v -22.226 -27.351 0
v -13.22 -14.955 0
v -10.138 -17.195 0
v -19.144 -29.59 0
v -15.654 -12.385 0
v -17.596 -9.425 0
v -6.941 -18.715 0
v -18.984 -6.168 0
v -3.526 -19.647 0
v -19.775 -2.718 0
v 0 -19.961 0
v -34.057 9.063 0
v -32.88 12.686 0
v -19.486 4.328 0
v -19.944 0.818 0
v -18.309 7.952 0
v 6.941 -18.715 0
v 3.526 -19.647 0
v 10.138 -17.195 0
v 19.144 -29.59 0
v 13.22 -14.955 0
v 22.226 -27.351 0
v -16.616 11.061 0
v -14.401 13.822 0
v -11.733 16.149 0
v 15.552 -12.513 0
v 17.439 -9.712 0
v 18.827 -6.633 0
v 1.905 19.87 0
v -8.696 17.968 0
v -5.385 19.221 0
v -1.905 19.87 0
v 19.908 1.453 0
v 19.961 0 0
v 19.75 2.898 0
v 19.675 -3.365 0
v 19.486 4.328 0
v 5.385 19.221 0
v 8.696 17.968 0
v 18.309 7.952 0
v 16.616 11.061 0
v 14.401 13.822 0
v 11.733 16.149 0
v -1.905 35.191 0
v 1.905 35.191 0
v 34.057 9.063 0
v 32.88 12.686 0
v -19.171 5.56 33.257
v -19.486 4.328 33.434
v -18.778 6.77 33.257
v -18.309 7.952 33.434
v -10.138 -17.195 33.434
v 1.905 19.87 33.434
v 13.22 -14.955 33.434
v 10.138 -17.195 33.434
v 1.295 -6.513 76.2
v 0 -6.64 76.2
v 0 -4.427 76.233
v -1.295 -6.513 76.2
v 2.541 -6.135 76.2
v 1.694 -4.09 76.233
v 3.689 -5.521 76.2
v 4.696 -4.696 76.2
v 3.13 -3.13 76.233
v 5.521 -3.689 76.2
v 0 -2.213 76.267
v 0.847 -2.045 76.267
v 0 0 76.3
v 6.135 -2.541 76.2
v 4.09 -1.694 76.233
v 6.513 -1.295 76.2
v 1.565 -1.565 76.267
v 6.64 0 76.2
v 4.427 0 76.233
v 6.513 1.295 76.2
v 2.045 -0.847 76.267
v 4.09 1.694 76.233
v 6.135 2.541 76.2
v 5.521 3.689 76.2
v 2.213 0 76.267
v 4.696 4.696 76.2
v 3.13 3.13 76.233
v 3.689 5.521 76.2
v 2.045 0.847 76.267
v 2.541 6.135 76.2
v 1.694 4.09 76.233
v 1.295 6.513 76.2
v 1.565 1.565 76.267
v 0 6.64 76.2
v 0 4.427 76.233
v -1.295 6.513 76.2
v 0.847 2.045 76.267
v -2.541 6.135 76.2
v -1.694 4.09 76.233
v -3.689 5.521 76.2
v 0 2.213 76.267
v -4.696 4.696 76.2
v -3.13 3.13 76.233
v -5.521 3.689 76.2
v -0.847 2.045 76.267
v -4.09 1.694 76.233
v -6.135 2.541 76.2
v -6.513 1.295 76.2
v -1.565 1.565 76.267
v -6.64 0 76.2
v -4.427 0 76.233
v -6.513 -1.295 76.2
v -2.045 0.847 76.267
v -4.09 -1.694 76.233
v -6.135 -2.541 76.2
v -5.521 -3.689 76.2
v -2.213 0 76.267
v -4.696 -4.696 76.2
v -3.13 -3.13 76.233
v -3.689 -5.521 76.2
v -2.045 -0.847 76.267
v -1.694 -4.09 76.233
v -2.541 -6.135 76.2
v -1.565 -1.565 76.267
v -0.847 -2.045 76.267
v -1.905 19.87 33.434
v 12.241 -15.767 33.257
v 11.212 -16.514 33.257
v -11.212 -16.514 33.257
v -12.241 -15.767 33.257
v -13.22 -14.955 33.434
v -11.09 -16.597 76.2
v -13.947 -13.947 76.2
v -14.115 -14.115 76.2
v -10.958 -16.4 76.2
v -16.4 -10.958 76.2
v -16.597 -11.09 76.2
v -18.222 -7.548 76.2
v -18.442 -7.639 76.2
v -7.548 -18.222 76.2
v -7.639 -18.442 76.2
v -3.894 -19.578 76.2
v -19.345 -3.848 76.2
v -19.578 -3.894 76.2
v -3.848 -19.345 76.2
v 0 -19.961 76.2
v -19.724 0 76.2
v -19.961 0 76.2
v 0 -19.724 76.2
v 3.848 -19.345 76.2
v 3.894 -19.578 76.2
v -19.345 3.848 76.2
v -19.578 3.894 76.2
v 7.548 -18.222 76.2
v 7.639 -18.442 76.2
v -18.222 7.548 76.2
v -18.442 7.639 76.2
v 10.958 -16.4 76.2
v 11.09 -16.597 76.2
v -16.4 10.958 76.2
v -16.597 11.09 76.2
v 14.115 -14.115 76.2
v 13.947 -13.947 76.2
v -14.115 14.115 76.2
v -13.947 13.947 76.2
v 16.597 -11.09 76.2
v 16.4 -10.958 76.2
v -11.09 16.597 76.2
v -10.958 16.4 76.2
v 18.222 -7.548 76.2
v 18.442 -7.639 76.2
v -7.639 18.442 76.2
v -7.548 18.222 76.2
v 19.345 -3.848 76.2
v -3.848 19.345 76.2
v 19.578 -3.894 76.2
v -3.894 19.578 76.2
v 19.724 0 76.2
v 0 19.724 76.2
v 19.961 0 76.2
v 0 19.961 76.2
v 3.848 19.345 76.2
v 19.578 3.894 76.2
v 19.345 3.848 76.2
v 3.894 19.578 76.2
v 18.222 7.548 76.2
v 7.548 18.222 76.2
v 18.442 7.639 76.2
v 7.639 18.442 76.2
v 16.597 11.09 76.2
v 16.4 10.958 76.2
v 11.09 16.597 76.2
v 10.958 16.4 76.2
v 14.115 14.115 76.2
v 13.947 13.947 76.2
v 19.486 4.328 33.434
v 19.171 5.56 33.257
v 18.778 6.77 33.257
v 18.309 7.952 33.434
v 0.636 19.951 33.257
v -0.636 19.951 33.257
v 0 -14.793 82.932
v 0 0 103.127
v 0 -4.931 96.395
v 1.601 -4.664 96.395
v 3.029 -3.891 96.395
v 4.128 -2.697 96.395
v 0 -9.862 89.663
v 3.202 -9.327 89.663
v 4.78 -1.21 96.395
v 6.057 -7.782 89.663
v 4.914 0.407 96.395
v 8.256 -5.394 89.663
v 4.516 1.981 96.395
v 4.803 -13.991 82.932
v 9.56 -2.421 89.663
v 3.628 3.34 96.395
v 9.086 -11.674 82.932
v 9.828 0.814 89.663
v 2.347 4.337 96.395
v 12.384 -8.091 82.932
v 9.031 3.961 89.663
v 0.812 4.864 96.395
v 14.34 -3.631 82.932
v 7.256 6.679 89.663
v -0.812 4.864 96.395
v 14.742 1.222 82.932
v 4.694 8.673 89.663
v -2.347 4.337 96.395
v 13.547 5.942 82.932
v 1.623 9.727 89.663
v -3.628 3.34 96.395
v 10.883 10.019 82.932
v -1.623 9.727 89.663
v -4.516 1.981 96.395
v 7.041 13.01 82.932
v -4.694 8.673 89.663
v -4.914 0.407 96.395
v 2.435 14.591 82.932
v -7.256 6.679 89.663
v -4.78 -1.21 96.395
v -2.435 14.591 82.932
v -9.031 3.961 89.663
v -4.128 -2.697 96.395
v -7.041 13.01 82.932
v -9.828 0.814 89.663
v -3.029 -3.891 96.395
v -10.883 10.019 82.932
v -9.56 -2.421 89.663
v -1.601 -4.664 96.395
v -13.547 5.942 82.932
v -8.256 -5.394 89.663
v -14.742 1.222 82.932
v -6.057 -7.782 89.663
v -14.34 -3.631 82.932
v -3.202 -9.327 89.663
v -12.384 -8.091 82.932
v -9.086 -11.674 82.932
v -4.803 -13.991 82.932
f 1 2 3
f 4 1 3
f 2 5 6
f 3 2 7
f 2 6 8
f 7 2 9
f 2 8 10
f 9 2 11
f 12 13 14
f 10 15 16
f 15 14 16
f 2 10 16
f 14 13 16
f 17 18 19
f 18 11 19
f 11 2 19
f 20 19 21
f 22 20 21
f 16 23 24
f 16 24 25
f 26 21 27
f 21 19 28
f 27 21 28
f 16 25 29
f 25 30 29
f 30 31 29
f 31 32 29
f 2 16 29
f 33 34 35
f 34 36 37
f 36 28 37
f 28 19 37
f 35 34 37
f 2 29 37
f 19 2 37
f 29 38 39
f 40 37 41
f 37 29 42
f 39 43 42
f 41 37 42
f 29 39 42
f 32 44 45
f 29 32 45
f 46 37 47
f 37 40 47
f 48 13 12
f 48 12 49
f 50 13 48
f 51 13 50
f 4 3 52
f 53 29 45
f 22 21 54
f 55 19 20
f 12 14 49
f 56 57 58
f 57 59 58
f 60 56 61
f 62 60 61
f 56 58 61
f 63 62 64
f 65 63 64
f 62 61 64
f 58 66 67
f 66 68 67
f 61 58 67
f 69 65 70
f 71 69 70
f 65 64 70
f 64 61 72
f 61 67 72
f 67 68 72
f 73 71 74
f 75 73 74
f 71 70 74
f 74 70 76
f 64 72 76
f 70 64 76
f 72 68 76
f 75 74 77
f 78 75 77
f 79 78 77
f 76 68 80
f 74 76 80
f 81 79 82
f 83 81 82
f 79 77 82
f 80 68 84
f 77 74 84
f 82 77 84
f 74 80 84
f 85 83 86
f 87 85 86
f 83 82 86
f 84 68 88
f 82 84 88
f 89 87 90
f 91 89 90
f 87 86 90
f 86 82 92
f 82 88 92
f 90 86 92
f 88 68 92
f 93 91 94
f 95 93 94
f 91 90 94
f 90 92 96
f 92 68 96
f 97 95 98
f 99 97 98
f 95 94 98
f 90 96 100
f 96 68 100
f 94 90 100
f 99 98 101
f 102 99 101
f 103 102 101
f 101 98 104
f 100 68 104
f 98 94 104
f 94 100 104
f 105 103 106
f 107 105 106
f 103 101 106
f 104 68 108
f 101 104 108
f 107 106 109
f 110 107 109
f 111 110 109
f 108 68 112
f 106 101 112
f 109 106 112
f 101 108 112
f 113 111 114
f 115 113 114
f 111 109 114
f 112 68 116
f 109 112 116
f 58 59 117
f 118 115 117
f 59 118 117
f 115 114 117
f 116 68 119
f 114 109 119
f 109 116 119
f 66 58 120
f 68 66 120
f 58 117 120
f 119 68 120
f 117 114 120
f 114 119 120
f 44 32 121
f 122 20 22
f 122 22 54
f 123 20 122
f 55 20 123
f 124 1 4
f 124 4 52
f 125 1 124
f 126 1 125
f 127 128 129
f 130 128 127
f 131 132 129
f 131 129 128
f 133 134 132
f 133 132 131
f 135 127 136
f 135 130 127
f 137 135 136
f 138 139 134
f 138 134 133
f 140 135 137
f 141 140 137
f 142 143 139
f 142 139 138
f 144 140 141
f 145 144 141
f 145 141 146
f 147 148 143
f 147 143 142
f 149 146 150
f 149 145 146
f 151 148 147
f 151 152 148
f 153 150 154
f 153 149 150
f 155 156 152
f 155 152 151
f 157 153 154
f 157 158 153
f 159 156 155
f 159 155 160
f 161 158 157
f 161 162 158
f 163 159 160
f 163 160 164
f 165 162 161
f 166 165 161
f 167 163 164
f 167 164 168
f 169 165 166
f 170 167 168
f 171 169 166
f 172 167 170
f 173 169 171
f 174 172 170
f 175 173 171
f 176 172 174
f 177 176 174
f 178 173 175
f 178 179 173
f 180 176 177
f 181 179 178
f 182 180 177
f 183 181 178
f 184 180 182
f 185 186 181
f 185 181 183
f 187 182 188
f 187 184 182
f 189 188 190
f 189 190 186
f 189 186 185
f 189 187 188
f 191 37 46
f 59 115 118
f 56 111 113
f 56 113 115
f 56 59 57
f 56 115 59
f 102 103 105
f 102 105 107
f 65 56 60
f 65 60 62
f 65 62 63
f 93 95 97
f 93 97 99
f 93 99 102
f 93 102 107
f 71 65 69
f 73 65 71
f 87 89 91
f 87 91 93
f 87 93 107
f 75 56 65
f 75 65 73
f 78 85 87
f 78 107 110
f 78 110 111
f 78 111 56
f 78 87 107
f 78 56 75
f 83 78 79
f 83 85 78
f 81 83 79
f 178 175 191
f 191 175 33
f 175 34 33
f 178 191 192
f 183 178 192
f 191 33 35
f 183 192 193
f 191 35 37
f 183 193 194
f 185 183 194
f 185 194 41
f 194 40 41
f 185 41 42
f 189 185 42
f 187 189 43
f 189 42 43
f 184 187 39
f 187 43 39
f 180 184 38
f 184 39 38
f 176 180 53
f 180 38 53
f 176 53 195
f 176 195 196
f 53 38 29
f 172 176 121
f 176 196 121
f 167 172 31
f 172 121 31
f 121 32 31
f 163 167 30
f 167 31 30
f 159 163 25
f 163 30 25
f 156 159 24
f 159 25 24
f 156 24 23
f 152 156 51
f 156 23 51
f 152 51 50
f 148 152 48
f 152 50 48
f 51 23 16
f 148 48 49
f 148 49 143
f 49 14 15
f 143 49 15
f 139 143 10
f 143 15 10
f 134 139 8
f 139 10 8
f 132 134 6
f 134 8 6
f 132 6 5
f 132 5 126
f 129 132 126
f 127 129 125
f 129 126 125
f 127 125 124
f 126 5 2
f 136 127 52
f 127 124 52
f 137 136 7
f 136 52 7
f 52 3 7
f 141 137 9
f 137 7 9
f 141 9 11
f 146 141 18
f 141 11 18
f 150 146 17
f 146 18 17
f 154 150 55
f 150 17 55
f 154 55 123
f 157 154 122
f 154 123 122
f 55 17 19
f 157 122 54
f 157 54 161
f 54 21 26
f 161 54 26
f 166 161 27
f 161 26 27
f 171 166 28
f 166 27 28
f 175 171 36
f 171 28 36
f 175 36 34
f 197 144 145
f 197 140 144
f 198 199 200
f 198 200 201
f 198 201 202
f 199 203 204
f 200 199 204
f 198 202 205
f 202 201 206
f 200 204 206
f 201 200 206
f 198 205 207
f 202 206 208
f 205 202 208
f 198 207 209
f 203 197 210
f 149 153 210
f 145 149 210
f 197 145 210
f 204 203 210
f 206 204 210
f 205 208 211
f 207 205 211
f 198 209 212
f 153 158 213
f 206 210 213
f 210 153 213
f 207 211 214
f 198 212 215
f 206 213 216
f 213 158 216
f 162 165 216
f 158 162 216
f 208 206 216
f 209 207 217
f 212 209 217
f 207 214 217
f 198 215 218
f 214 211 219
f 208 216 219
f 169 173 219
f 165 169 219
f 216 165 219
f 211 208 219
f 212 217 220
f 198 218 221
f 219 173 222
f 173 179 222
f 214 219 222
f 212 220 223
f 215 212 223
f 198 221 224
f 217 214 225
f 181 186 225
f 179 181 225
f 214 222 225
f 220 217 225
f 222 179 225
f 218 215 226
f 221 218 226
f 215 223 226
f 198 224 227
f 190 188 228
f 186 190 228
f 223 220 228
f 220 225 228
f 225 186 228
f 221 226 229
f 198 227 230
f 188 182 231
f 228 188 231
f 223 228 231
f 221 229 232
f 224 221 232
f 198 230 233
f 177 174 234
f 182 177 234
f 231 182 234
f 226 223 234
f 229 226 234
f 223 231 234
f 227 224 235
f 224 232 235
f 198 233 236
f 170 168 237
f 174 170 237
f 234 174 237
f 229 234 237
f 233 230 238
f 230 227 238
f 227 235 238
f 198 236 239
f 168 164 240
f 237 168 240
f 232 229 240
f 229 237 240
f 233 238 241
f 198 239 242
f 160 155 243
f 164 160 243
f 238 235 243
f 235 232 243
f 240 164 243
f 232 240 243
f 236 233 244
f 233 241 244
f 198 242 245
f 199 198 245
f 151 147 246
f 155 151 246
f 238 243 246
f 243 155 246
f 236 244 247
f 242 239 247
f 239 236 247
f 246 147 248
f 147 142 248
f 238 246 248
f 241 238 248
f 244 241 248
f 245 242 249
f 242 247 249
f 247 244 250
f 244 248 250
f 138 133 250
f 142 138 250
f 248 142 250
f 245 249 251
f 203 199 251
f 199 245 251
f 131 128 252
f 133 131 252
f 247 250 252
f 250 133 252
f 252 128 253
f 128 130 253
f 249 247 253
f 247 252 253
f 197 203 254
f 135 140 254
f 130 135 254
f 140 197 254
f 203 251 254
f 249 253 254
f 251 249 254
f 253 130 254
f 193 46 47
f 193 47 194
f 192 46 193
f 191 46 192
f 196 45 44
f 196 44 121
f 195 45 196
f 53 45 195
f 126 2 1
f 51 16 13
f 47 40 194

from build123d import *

# Parameters (mm, degrees)
F0_R     = 19.961145
F1_DEPTH = 76.2
F3_DEPTH = 1.905
F4_COUNT = 5


with BuildPart() as f1:
    # F0 (on Top) → F1 (new body)
    with BuildSketch(Plane.XY):
        Circle(F0_R)
    extrude(amount=F1_DEPTH)

    # F2 (on Right) → F3 (join, symmetric)
    with BuildSketch(Plane.YZ):
        Polygon((11.911715, 50.8), (11.911715, 0), (35.1912, 0), align=None)
    extrude(amount=F3_DEPTH, both=True)



with BuildPart() as f4_1:
    # F4: instance of F1
    add(f1.part.rotate(Axis((0, 0, 0), (0, 0, -1)), 1 * 360 / F4_COUNT))


with BuildPart() as f4_2:
    # F4: instance of F1
    add(f1.part.rotate(Axis((0, 0, 0), (0, 0, -1)), 2 * 360 / F4_COUNT))


with BuildPart() as f4_3:
    # F4: instance of F1
    add(f1.part.rotate(Axis((0, 0, 0), (0, 0, -1)), 3 * 360 / F4_COUNT))


with BuildPart() as f4_4:
    # F4: instance of F1
    add(f1.part.rotate(Axis((0, 0, 0), (0, 0, -1)), 4 * 360 / F4_COUNT))


with BuildPart() as f1_1:
    add(f1.part)

    add(f4_1.part)  # F6 merges F4_1

    add(f4_2.part)  # F6 merges F4_2

    add(f4_3.part)  # F6 merges F4_3

    add(f4_4.part)  # F6 merges F4_4
    # F5 (on Right) → F6 (revolve)
    with BuildSketch(Plane.YZ):
        Polygon((-19.869778, 76.00043), (0, 76.300174), (0, 103.126749), align=None)
    revolve(axis=Axis((0, 0, 89.713462), (0, 0, 1)))


solid = f1_1.part
